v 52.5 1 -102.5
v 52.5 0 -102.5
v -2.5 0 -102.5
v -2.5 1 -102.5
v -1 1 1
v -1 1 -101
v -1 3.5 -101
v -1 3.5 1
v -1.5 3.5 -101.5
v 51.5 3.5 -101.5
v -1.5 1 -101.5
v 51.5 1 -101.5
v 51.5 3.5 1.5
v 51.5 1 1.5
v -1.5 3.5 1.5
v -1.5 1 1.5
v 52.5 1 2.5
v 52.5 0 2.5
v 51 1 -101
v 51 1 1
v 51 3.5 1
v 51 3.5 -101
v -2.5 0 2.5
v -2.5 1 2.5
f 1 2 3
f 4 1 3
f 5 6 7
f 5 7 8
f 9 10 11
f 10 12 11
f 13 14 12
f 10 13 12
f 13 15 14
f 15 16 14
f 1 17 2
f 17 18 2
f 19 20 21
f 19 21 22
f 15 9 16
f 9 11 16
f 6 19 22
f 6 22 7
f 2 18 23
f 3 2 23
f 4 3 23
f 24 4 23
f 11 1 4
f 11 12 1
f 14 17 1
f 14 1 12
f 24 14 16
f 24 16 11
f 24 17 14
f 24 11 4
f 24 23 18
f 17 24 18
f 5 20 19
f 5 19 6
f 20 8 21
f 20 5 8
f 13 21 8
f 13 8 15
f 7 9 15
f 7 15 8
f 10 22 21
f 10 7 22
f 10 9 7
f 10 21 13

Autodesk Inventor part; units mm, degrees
ref_plane "우측면도" through (0, 0, 0) normal (1, 0, 0) x (0, 1, 0)
ref_plane "평면도" through (0, 0, 0) normal (0, 1, 0) x (-1, 0, 0)
ref_plane "정면도" through (0, 0, 0) normal (0, 0, 1) x (1, 0, 0)
sketch "스케치1" plane through (0, 0, 0) normal (0, 1, 0) x (-1, 0, 0)
  line L0 (0, 0) -> (0, -100)
  line L1 (0, -100) -> (-50, -100)
  line L2 (-50, -100) -> (-50, 0)
  line L3 (-50, 0) -> (0, 0)
  line L4 (2.5, -102.5) -> (2.5, 2.5)
  line L5 (2.5, 2.5) -> (-52.5, 2.5)
  line L6 (-52.5, 2.5) -> (-52.5, -102.5)
  line L7 (-52.5, -102.5) -> (2.5, -102.5)
  line L8 (1, -101) -> (1, 1)
  line L9 (1, 1) -> (-51, 1)
  line L10 (-51, 1) -> (-51, -101)
  line L11 (-51, -101) -> (1, -101)
  line L12 (1.5, -101.5) -> (1.5, 1.5)
  line L13 (1.5, 1.5) -> (-51.5, 1.5)
  line L14 (-51.5, 1.5) -> (-51.5, -101.5)
  line L15 (-51.5, -101.5) -> (1.5, -101.5)
  dimension "d0" = 50
  dimension "d1" = 100
  dimension "d2" = 2.5
  dimension "d3" = 1.5
  dimension "d4" = 0.5
extrude "돌출1" add sketch "스케치1" along normal blind 1 contours L0 L1 L2 L3 | L7 L6 L5 L4 | L11 L10 L9 L8 | L15 L14 L13 L12
sketch "스케치2" plane through (0, 1, 0) normal (0, 1, 0) x (1, 0, 0)
  line L0 (51.5, -1.5) -> (51.5, 101.5) projected
  line L1 (51, -1) -> (51, 101) projected
  line L2 (51.5, 101.5) -> (-1.5, 101.5) projected
  line L3 (51, 101) -> (-1, 101) projected
  line L4 (-1.5, 101.5) -> (-1.5, -1.5) projected
  line L5 (-1, 101) -> (-1, -1) projected
  line L6 (-1, -1) -> (51, -1) projected
  line L7 (-1.5, -1.5) -> (51.5, -1.5) projected
  point P0 (0, 0)
extrude "돌출3" add sketch "스케치2" along normal blind 2.5
properties part number "호출벨 new 커버"
